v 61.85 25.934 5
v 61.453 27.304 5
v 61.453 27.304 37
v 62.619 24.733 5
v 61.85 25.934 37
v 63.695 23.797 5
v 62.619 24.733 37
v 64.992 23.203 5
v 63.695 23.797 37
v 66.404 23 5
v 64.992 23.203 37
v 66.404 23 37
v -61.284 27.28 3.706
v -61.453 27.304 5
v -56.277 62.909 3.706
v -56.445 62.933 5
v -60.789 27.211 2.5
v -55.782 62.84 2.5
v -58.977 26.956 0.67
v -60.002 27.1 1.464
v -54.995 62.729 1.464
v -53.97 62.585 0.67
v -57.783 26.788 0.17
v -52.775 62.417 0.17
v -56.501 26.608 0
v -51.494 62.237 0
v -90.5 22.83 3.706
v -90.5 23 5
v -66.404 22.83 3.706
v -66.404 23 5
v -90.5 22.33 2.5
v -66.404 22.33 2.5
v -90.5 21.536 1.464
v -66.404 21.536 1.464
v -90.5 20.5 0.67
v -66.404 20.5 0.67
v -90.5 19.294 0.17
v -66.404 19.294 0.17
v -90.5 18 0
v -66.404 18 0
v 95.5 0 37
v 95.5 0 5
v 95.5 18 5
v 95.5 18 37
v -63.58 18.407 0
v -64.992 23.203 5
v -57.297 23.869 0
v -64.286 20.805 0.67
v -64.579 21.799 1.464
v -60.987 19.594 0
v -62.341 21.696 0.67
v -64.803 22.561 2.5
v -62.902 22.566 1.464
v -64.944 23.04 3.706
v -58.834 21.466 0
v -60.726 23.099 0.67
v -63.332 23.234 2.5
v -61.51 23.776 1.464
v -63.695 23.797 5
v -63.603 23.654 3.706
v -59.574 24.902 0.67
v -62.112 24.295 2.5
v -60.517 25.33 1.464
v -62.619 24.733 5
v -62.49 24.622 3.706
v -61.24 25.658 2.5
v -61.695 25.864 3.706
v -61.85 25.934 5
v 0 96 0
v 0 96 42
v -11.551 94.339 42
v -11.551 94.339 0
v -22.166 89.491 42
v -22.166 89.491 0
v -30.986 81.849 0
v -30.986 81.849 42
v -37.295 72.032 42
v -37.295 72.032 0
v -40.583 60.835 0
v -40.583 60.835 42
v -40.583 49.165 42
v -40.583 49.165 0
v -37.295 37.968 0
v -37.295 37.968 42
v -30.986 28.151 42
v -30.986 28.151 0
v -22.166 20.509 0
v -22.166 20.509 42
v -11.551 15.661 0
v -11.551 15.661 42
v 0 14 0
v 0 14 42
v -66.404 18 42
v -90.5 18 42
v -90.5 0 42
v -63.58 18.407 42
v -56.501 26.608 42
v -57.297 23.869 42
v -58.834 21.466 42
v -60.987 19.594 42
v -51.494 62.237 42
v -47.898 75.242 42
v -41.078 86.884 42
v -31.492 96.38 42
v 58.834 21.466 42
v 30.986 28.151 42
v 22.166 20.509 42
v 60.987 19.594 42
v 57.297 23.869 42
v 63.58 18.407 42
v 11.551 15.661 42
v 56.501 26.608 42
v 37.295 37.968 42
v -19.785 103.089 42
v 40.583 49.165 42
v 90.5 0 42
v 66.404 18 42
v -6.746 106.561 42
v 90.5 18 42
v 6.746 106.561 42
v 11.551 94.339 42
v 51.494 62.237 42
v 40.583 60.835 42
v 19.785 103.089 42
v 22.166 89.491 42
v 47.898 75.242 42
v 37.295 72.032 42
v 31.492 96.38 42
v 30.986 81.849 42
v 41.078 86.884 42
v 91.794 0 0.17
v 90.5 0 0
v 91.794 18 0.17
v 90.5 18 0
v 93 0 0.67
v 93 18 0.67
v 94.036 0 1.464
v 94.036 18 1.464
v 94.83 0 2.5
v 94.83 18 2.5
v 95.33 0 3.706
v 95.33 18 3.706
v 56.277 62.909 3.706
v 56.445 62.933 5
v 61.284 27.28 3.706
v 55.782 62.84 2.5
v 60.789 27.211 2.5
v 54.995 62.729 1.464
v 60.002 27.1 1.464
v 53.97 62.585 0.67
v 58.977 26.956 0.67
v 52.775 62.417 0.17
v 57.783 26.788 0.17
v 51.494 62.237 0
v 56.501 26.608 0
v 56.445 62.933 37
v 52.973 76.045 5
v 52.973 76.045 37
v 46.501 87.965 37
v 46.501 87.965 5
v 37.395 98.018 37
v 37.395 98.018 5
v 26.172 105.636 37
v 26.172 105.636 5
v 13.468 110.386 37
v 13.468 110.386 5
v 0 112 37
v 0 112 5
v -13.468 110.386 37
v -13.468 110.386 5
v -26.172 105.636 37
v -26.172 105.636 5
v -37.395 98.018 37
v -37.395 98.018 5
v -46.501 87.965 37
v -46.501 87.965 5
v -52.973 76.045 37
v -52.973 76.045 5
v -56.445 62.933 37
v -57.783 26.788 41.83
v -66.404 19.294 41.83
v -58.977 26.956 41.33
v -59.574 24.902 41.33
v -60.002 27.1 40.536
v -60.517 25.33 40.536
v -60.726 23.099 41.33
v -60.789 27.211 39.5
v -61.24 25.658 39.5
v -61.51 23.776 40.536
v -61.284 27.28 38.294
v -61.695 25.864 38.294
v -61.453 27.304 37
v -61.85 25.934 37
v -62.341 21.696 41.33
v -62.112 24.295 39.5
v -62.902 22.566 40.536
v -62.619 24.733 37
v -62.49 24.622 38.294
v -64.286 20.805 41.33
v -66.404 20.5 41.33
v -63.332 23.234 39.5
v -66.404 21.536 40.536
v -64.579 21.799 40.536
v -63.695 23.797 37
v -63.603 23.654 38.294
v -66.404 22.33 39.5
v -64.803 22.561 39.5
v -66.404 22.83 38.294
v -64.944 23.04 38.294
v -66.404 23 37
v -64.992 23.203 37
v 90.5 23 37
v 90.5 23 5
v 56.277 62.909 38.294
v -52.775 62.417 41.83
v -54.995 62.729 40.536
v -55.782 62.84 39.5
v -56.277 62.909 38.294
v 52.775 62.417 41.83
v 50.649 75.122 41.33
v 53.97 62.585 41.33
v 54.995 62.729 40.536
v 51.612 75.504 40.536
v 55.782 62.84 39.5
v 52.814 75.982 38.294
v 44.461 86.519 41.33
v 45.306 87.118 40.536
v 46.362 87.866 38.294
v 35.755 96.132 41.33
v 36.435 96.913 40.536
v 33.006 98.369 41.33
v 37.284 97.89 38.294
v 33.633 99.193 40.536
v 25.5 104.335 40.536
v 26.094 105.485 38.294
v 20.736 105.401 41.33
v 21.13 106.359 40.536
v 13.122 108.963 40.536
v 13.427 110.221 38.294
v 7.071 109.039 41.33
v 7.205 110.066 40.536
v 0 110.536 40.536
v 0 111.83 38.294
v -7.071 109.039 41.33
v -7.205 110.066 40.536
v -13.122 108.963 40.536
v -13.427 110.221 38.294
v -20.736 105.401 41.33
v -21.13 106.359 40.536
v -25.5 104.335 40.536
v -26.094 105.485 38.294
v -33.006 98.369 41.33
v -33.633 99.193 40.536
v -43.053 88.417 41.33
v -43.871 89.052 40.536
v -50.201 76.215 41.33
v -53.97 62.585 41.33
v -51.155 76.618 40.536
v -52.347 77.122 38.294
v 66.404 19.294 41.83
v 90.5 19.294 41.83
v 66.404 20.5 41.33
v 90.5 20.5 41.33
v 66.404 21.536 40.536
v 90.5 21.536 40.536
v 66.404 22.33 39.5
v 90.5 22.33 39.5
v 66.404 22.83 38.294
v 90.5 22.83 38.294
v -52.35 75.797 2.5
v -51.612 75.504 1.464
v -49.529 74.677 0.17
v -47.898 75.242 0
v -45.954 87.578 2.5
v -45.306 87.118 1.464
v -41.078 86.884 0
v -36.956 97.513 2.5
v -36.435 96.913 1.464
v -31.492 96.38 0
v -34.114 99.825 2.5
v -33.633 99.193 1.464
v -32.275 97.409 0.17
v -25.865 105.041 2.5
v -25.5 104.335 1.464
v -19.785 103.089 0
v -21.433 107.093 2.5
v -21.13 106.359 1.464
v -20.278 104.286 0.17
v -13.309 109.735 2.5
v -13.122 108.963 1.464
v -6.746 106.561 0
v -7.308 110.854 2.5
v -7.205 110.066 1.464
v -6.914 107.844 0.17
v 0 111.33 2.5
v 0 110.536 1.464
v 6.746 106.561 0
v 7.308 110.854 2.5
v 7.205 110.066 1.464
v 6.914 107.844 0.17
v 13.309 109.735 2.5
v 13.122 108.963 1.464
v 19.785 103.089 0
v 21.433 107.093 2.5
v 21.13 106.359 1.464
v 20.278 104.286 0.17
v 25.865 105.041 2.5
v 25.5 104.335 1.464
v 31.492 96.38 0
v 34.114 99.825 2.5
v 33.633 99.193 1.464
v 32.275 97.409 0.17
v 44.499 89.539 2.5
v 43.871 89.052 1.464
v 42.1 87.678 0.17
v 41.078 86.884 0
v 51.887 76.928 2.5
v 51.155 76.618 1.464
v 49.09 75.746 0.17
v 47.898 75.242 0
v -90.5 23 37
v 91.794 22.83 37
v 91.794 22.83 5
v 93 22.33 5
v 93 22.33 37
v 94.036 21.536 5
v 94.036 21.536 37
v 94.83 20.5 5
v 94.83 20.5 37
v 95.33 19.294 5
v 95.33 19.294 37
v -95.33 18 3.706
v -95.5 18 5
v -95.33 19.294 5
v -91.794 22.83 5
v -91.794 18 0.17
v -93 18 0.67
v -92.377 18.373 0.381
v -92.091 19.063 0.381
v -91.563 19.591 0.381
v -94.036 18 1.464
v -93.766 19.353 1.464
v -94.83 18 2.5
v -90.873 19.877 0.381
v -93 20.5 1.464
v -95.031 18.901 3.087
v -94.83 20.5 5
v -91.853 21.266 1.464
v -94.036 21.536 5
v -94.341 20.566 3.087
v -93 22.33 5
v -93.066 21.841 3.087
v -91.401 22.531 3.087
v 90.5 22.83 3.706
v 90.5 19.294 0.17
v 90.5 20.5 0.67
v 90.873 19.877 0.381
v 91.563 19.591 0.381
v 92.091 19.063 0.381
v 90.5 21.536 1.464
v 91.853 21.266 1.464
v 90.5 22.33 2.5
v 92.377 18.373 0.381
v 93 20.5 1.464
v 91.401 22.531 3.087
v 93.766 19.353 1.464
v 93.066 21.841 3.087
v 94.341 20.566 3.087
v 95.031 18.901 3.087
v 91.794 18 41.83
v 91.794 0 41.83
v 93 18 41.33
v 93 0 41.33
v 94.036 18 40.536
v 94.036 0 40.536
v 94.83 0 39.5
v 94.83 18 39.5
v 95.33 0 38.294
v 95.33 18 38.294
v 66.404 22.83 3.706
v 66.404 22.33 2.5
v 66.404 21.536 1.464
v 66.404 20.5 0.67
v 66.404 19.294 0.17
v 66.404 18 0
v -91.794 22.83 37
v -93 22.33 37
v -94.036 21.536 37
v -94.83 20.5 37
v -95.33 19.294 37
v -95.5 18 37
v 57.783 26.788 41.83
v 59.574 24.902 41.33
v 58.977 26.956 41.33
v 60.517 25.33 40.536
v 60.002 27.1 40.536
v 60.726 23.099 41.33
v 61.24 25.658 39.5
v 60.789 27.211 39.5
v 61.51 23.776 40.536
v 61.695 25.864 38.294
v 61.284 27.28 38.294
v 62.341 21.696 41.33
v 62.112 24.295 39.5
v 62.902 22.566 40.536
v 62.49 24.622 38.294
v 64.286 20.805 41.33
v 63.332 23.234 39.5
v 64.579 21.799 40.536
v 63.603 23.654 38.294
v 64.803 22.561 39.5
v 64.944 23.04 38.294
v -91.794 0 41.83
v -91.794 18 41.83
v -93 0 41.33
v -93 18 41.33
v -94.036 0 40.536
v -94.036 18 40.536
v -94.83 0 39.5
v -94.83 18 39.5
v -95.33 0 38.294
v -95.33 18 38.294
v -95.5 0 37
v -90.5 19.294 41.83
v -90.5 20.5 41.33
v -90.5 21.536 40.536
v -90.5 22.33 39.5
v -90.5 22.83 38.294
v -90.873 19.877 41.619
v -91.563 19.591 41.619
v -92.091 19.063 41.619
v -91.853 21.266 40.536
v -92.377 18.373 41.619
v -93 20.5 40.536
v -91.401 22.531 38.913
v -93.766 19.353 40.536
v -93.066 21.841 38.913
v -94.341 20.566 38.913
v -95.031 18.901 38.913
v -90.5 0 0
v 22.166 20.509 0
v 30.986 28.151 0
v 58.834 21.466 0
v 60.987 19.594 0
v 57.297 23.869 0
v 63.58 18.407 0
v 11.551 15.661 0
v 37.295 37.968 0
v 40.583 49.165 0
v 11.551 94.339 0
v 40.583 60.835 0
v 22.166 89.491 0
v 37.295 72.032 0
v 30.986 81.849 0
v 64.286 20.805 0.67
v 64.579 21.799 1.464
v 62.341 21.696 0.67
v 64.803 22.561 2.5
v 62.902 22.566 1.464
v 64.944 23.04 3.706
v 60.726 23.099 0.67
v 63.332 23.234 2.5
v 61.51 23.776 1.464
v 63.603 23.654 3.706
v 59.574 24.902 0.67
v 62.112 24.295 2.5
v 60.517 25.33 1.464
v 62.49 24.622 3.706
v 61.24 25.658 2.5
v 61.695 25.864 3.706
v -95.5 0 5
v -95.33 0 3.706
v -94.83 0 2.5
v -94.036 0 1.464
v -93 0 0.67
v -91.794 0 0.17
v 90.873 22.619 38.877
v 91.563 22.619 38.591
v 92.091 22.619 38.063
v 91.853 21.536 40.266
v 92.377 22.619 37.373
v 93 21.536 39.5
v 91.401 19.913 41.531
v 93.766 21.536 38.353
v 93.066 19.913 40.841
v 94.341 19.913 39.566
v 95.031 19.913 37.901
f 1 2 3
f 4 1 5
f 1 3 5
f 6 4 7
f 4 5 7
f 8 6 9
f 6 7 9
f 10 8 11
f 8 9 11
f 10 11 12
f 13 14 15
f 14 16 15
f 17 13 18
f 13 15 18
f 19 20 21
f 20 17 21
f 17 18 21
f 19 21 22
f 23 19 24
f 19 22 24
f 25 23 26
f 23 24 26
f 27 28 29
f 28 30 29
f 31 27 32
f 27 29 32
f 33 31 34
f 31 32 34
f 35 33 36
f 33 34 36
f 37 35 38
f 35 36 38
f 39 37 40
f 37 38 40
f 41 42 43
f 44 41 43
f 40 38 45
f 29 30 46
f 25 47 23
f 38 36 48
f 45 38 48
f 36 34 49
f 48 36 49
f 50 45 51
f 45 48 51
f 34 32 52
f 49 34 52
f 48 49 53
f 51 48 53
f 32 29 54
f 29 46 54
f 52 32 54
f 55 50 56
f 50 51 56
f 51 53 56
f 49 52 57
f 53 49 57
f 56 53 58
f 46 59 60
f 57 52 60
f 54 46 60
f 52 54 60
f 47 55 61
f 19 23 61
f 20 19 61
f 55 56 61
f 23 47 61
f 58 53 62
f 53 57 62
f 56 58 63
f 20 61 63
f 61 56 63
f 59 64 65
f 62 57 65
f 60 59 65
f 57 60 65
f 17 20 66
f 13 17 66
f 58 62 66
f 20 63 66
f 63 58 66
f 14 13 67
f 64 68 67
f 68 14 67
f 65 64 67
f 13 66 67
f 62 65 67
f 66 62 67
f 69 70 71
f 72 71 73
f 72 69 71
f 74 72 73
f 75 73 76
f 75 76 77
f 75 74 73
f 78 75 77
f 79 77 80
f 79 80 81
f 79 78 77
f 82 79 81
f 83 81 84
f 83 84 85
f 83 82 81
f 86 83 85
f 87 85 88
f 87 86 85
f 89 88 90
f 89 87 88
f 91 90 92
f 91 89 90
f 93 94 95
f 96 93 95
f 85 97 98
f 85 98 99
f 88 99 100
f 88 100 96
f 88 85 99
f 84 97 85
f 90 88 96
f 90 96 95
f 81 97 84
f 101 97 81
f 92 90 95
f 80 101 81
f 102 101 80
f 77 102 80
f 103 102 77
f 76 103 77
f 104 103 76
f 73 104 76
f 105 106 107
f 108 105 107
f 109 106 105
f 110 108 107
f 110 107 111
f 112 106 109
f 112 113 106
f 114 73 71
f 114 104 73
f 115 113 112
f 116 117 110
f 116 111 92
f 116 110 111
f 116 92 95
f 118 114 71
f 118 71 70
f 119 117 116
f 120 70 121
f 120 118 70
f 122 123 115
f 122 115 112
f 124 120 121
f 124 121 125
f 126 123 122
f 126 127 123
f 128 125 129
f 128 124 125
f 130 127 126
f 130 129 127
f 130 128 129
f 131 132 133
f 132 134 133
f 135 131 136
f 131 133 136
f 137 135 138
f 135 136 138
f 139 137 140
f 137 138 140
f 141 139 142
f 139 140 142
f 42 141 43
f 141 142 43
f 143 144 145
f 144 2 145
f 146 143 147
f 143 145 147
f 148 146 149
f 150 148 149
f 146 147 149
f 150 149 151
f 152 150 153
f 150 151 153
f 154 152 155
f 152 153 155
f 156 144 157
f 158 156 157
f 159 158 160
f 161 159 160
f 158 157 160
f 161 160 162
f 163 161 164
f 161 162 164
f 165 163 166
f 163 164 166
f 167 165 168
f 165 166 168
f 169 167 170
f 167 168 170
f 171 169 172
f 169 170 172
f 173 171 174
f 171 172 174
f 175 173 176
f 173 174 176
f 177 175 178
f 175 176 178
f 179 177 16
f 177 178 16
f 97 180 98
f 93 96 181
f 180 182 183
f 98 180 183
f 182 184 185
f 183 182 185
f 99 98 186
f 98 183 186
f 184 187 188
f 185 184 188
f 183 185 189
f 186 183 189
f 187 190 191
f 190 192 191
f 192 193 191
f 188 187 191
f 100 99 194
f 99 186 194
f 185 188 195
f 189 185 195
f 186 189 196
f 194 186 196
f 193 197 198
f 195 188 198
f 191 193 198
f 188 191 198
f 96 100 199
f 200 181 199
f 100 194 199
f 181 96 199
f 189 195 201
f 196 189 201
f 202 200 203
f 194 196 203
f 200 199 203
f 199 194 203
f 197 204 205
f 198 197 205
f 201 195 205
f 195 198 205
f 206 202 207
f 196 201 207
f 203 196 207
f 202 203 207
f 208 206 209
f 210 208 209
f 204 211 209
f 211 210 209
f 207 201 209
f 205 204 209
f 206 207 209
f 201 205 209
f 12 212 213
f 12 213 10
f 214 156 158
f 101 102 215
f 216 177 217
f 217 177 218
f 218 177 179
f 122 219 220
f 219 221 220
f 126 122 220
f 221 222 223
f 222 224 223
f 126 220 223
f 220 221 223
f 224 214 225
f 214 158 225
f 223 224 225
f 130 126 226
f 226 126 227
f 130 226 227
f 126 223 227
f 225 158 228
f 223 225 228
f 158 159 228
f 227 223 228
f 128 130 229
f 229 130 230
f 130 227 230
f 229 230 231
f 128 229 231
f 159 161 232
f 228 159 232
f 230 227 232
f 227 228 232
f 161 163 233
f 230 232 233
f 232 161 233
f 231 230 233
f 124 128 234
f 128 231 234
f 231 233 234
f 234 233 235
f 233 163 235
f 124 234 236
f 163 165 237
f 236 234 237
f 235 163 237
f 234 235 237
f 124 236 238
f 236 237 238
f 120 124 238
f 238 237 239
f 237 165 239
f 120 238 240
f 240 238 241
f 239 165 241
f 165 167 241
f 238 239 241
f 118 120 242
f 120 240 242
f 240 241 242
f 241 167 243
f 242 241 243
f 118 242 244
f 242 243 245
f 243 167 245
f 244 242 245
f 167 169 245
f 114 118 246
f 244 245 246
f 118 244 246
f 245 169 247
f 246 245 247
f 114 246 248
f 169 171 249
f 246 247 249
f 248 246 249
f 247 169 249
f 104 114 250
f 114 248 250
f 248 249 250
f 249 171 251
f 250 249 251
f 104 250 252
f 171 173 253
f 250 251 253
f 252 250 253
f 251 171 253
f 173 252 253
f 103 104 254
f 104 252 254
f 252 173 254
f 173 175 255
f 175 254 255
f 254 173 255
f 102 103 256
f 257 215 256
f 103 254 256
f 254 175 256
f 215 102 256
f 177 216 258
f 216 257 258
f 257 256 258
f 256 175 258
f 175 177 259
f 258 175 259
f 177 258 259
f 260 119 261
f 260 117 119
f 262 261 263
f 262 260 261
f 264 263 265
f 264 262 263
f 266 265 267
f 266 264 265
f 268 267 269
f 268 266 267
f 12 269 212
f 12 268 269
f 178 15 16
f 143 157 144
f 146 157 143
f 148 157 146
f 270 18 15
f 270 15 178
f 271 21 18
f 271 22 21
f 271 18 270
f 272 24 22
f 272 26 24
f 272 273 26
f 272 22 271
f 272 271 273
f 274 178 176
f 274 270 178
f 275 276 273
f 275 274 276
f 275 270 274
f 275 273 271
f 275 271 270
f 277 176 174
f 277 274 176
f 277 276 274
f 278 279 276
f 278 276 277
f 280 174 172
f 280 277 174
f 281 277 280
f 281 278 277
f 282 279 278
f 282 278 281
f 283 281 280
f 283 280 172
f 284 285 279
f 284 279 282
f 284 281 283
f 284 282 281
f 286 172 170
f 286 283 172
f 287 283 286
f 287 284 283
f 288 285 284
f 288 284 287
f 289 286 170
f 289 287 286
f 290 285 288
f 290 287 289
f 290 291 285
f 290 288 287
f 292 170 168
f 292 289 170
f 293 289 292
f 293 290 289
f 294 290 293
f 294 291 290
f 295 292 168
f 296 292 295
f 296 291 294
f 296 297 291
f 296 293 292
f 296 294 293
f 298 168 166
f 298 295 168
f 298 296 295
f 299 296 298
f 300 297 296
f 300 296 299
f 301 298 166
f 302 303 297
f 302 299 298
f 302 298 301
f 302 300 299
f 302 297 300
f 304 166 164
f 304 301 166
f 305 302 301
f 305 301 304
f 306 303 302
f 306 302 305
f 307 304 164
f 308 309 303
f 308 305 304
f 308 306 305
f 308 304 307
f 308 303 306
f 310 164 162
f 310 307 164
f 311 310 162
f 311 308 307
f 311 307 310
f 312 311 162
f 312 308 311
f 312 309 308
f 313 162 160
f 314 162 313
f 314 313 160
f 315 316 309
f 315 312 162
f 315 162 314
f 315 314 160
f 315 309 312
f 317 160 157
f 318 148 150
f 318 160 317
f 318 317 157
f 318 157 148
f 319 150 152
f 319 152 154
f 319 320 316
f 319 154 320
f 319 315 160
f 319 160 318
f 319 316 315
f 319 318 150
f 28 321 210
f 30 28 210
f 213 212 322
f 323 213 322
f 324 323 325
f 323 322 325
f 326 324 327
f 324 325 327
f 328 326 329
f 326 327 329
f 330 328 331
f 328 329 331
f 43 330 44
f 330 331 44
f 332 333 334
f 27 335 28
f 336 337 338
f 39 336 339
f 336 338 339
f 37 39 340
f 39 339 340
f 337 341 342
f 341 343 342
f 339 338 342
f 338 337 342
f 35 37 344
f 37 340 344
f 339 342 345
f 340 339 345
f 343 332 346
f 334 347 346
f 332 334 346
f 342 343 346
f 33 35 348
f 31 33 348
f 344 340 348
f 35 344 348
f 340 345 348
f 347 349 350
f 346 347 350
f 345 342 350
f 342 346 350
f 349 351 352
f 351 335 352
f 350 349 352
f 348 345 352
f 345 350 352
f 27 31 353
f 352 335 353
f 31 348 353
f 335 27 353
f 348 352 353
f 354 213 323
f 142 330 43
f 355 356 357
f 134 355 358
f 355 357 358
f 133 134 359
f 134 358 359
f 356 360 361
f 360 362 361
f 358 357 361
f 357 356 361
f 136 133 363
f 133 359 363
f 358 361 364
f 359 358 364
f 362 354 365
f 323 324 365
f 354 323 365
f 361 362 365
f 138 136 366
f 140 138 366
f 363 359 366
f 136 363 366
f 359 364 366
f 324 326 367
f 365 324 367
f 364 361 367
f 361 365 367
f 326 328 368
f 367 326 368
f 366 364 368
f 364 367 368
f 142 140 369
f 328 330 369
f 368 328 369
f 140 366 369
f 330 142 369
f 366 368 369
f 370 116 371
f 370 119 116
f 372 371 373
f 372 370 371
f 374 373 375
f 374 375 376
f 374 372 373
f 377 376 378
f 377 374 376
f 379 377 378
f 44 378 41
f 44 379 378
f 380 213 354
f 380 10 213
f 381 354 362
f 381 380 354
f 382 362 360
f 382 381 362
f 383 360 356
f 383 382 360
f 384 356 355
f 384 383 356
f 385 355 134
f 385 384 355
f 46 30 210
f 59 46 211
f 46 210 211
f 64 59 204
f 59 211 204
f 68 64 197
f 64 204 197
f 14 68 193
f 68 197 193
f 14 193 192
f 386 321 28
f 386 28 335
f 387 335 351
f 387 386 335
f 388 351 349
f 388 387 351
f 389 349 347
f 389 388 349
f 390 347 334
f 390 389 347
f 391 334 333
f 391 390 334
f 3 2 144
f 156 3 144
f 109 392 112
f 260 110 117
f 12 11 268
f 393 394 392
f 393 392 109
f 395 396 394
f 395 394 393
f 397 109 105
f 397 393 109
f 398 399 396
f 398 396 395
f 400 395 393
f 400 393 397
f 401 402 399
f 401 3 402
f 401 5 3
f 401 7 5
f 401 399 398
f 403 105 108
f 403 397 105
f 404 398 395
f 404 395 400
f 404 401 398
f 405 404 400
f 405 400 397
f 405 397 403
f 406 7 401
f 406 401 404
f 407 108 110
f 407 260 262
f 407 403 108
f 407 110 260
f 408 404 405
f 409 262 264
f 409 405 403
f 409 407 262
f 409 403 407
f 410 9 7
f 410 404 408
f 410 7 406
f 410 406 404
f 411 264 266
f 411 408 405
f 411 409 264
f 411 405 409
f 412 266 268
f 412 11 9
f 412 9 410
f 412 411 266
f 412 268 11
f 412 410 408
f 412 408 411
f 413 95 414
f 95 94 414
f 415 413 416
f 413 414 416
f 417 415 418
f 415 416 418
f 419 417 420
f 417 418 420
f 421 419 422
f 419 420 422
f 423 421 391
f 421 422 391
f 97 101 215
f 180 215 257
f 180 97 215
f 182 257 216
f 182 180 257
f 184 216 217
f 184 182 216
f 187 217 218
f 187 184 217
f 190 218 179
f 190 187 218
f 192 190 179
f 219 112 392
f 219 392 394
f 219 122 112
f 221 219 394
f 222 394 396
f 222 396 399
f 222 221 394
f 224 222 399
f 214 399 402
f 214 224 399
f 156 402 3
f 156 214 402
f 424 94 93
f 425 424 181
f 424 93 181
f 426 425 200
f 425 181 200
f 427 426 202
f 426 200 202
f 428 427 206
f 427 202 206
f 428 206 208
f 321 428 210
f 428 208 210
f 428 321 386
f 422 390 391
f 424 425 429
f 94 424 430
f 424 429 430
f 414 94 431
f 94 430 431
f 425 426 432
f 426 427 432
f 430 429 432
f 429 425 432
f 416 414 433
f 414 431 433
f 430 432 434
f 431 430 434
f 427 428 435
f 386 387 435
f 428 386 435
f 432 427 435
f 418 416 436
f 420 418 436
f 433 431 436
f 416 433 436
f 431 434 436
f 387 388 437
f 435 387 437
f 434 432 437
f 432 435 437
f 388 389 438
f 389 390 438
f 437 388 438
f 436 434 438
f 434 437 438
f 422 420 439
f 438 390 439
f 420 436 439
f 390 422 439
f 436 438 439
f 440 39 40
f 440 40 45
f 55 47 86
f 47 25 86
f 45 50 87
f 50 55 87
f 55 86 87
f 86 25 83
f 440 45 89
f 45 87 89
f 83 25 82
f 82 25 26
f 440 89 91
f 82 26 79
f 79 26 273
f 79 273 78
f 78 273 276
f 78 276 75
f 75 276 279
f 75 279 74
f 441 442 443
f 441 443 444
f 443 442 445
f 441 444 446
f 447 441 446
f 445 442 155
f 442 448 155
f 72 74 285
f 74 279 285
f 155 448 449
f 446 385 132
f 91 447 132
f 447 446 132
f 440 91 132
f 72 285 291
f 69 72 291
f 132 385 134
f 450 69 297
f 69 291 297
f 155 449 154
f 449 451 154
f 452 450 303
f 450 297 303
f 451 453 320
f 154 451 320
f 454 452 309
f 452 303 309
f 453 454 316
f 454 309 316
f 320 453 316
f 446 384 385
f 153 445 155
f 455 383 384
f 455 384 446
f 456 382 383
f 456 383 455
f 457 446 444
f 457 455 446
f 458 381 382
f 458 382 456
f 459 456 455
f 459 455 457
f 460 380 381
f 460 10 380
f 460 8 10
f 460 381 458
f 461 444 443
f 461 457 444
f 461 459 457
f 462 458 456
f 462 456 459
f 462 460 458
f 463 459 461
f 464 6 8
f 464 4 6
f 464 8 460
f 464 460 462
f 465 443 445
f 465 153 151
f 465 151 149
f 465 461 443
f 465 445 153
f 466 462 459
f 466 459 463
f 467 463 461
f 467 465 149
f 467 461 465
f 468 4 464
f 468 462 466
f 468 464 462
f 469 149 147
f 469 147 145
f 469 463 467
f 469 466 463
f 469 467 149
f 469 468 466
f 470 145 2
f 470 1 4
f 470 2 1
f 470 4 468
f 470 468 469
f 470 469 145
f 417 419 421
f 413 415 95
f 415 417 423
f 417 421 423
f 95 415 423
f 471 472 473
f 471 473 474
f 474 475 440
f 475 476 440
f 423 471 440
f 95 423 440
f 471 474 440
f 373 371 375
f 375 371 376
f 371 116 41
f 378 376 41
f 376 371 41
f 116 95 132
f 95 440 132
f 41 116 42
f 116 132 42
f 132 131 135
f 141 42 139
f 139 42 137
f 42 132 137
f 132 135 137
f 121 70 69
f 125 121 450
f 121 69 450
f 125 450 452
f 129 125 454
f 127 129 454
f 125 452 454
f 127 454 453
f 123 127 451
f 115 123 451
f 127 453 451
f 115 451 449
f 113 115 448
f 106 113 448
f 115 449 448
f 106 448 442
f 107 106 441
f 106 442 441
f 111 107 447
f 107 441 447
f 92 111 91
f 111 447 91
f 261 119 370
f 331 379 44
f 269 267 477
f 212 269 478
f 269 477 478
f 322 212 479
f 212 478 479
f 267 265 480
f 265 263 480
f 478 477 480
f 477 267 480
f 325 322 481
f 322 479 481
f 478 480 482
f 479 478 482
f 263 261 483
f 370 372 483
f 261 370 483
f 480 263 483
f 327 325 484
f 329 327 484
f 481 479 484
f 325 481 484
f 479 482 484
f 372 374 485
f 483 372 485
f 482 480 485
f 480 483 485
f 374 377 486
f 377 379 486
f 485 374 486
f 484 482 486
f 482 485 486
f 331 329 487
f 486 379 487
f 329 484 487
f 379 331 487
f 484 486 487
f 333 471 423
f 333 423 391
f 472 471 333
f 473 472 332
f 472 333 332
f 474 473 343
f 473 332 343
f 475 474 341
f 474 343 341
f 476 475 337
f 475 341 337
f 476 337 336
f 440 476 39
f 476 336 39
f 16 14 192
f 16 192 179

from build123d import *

# Parameters (mm, degrees)
BOSS_EXTRUDE1_DEPTH = 42
FILLET1_R           = 5


with BuildPart() as part:
    # Sketch1 → Boss-Extrude1 (new body)
    with BuildSketch(Plane.XY):
        with BuildLine():
            Line((0, 0), (-95.5, 0))
            Line((-95.5, 0), (-95.5, 23))
            Line((-95.5, 23), (-62.057478344, 23))
            Line((-62.057478344, 23), (-56.445279918, 62.932866755))
            ThreePointArc((-56.445279918, 62.932866755), (-37.395364652, 98.018446073), (0, 112))
            Line((0, 112), (0, 96))
            ThreePointArc((0, 96), (-41, 55), (0, 14))
            Line((0, 14), (0, 0))
        make_face()
    boss_extrude1 = extrude(amount=BOSS_EXTRUDE1_DEPTH)

    # Mirror1: Boss-Extrude1 across plane
    add(boss_extrude1.mirror(Plane(origin=(0, 112, 42), x_dir=(0, 0, 1), z_dir=(-1, 0, 0))))

    # Fillet1
    fillet1_edges = [part.edges().sort_by_distance(p)[0] for p in [
        (0, 112, 0),
        (-95.5, 23, 21),
        (-62.057478344, 23, 21),
        (0, 112, 42),
        (-59.251379131, 42.966433377, 42),
        (95.5, 11.5, 42),
        (-78.778739172, 23, 42),
        (78.778739172, 23, 42),
        (95.5, 23, 21),
        (59.251379131, 42.966433377, 42),
        (62.057478344, 23, 21),
        (59.251379131, 42.966433377, 0),
        (78.778739172, 23, 0),
        (-95.5, 11.5, 42),
        (95.5, 11.5, 0),
        (-95.5, 11.5, 0),
        (-78.778739172, 23, 0),
        (-59.251379131, 42.966433377, 0),
    ]]
    fillet(fillet1_edges, radius=FILLET1_R)


solid = part.part
